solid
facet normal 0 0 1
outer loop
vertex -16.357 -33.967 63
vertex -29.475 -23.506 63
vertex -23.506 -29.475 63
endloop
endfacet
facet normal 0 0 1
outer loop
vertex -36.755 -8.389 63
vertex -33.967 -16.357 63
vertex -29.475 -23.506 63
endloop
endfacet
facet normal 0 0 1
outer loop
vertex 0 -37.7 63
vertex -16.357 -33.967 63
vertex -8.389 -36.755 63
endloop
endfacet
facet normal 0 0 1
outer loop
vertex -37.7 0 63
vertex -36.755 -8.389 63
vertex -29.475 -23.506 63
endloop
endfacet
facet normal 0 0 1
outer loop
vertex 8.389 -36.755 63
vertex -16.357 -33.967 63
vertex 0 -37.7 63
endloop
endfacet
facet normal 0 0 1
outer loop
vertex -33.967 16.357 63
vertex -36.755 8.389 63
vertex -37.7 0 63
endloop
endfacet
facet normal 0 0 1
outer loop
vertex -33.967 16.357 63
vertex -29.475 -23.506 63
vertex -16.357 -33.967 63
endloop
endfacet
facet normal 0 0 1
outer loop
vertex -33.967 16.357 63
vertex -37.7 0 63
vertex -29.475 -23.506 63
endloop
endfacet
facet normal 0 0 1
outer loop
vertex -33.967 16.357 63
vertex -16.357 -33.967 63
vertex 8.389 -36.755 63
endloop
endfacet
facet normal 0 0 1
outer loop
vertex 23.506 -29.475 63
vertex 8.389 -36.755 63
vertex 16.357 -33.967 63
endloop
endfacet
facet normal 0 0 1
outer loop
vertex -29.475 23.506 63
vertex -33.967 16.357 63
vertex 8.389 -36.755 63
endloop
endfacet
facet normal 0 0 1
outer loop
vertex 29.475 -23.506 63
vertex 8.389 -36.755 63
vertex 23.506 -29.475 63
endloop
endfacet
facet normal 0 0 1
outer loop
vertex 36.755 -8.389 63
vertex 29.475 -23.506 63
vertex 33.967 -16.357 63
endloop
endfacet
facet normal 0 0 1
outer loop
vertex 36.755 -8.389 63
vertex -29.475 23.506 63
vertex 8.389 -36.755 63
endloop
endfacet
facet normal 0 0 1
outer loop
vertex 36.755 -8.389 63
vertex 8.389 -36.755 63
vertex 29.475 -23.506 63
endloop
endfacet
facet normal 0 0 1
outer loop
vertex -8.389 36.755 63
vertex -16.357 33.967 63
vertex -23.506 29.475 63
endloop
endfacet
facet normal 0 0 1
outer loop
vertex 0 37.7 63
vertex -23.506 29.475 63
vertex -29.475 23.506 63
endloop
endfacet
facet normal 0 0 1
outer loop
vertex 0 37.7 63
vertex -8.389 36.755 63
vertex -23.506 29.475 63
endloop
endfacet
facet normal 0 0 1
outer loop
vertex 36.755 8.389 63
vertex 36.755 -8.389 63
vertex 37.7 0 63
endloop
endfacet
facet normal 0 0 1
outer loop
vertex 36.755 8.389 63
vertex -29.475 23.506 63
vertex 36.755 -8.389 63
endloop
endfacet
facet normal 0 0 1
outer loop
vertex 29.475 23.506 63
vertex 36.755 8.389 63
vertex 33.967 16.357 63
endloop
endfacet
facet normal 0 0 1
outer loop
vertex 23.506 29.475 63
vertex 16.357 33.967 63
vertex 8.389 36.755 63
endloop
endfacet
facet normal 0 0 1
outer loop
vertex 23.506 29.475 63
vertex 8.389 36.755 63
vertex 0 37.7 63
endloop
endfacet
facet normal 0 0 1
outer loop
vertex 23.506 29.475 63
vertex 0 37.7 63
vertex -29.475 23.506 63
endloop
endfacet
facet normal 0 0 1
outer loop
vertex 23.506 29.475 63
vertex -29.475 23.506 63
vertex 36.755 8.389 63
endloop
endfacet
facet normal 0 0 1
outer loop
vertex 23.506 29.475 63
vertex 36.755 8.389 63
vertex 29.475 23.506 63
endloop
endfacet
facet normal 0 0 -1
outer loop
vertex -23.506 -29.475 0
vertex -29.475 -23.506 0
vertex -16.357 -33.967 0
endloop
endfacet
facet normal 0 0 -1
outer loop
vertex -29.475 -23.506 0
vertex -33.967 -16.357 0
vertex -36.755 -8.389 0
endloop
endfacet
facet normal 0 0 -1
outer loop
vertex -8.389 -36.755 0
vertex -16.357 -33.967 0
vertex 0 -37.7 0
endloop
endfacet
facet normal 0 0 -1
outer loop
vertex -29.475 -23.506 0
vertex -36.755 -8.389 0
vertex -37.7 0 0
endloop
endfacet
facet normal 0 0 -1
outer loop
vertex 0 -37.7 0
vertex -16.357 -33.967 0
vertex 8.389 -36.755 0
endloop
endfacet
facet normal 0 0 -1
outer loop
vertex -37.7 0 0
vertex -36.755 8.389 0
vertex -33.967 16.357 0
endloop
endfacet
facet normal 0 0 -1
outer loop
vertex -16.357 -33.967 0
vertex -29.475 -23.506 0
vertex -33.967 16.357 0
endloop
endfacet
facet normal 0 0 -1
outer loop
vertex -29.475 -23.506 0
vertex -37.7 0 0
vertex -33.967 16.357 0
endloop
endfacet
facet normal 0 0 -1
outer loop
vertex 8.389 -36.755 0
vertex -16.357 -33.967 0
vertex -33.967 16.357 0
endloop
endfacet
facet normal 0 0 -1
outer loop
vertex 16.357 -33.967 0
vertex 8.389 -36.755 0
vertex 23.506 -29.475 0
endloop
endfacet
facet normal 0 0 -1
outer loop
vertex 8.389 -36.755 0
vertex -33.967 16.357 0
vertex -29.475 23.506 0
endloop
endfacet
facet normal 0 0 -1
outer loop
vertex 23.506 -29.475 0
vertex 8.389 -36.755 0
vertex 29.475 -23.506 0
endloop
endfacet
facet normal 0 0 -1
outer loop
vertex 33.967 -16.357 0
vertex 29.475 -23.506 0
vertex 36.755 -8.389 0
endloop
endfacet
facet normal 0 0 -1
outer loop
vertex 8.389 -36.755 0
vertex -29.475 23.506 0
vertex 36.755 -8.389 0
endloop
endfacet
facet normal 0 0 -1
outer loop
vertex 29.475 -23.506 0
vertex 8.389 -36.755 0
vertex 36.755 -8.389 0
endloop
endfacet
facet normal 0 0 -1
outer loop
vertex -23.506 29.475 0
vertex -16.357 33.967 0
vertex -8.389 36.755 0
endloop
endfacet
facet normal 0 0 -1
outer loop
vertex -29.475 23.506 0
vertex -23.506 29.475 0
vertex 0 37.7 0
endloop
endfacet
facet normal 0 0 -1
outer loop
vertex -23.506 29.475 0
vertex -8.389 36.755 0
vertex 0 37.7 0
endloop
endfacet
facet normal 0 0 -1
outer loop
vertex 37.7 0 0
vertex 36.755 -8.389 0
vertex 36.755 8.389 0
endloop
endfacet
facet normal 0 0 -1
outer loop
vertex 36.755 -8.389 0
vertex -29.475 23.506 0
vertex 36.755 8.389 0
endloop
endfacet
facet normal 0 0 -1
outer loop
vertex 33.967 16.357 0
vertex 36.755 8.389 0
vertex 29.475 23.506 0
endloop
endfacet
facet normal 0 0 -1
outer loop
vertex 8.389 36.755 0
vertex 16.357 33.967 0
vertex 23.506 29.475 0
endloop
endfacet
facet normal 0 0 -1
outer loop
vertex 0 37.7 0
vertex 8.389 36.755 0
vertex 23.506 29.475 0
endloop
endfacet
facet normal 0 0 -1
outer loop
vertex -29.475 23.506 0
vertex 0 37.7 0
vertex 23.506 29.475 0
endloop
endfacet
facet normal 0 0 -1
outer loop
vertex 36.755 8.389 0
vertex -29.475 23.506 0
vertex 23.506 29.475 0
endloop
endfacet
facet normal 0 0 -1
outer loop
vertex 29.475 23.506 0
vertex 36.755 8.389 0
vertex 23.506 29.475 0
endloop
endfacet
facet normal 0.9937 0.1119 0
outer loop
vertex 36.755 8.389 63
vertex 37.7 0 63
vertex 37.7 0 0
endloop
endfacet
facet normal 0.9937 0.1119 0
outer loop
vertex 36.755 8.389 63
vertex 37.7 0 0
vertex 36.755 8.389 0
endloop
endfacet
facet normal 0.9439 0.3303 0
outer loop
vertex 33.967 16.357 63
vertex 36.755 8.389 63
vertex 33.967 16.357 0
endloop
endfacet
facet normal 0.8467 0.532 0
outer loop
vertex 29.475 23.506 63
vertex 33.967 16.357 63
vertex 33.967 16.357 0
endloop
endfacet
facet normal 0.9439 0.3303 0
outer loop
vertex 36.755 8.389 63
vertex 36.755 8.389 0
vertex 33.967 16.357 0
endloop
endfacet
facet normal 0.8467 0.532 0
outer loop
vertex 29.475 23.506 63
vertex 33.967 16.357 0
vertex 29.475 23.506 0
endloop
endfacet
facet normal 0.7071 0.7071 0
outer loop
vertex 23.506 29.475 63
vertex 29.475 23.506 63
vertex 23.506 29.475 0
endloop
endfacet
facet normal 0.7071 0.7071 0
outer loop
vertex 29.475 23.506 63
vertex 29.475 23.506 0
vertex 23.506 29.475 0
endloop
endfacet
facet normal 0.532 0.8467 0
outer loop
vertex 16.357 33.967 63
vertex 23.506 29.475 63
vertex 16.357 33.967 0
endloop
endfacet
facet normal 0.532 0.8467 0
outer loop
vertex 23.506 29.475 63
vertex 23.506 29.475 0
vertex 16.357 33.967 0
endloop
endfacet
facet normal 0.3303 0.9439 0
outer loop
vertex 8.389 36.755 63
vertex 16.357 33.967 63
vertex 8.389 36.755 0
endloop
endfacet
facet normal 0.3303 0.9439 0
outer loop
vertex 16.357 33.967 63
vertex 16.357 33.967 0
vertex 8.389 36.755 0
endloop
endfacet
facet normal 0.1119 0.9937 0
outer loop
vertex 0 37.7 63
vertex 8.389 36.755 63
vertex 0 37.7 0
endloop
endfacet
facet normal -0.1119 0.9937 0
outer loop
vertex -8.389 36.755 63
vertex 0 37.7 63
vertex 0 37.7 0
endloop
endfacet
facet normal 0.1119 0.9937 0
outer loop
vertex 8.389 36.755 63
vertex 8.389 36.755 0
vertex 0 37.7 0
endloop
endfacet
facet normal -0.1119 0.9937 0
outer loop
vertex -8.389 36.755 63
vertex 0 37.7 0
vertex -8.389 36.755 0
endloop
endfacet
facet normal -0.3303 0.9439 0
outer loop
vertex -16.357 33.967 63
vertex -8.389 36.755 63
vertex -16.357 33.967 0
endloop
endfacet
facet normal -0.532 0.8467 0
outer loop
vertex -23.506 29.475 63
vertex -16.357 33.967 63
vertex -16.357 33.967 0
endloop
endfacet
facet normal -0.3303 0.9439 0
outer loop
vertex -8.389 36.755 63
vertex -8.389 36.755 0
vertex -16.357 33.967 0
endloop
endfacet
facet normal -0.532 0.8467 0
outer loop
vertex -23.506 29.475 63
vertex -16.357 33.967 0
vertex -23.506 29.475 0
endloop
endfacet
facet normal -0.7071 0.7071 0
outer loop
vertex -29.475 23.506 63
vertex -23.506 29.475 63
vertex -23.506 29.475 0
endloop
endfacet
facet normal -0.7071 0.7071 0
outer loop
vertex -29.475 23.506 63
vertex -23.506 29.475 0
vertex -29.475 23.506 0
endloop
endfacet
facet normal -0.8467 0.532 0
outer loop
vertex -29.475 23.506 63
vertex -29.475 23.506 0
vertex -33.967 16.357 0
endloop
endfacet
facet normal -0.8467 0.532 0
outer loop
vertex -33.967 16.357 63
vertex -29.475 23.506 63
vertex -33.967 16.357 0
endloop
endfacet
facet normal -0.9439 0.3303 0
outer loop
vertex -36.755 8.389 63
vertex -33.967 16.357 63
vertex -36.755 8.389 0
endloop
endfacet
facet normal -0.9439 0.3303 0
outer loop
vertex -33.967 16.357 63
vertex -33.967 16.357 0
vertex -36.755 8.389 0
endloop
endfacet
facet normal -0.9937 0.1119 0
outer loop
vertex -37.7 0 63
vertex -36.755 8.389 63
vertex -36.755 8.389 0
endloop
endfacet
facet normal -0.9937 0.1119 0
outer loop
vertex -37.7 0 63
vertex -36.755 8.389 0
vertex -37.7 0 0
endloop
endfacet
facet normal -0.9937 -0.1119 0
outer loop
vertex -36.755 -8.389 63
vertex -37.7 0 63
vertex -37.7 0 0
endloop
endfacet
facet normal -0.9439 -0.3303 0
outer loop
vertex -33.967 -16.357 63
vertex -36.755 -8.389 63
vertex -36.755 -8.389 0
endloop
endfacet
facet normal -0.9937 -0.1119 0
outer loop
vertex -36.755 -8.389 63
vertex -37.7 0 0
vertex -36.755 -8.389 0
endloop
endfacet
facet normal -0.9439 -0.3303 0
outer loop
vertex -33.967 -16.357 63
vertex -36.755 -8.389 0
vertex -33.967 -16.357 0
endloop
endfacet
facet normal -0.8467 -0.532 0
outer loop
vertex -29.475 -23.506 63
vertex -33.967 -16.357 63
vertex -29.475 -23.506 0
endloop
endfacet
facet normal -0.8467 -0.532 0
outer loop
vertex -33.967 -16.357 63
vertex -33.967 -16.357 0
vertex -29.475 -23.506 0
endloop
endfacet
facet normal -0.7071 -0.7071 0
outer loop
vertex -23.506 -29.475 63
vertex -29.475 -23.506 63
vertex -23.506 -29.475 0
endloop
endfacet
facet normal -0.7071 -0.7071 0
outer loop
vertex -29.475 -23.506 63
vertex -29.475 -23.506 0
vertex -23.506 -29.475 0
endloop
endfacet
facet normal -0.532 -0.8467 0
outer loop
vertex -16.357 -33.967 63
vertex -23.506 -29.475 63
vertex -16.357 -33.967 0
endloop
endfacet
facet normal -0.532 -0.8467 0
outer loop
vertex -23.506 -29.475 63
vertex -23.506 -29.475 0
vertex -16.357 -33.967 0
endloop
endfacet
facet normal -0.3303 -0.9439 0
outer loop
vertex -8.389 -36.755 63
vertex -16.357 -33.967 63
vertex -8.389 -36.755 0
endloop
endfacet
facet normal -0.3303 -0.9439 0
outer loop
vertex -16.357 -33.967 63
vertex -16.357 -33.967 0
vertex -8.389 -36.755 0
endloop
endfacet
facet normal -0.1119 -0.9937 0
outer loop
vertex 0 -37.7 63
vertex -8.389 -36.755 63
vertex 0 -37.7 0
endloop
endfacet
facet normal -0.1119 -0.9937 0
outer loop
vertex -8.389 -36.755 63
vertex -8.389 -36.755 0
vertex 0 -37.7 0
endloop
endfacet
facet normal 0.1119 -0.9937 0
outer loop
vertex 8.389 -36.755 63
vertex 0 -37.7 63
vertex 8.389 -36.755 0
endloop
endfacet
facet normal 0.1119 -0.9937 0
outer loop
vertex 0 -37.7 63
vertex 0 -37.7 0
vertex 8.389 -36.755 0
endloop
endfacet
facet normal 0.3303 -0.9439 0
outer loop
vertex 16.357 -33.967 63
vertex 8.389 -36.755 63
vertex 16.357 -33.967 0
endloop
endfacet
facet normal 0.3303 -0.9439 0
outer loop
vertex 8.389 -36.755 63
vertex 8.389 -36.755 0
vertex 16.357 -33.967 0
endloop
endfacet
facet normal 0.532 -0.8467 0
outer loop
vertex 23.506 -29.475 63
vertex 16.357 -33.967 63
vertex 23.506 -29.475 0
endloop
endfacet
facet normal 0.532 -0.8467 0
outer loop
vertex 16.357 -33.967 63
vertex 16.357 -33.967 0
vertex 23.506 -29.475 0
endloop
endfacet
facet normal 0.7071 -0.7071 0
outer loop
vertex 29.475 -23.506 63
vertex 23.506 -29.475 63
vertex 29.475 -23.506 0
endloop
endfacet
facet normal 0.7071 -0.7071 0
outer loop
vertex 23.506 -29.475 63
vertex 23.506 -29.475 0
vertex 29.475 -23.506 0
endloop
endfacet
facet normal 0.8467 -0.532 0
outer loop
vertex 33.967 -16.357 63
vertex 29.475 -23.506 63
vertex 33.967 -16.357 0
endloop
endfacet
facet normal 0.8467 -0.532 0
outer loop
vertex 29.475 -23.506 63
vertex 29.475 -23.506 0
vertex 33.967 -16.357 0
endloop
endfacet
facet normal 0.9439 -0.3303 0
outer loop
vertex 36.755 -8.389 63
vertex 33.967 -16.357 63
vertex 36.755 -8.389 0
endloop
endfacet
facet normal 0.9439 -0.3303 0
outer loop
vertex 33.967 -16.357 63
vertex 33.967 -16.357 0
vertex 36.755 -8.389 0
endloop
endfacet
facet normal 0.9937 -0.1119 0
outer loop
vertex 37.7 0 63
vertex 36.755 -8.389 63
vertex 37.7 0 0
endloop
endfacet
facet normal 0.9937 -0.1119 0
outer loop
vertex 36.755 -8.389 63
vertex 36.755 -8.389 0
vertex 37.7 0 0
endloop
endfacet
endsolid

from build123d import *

# Parameters (mm, degrees)
CYLINDER009_R     = 2.65
CYLINDER009_DEPTH = 30
CYLINDER008_R     = 4
CYLINDER008_DEPTH = 3.2
CYLINDER010_R     = 1.375
CYLINDER010_DEPTH = 10
CYLINDER011_R     = 2.6
CYLINDER011_DEPTH = 2.1
ARRAY002_X_COUNT  = 2
ARRAY002_X_PITCH  = 15
CYLINDER007_R     = 37.7
CYLINDER007_DEPTH = 63


with BuildPart() as cylinder009:
    # Cylinder009 → Cylinder009 (new body)
    with BuildSketch(Plane.XY.offset(63)):
        Circle(CYLINDER009_R)
    extrude(amount=CYLINDER009_DEPTH)


with BuildPart() as cylinder008:
    # Cylinder008 → Cylinder008 (new body)
    with BuildSketch(Plane.XY.offset(64.8)):
        Circle(CYLINDER008_R)
    extrude(amount=CYLINDER008_DEPTH)


with BuildPart() as cylinder010:
    # Cylinder010 → Cylinder010 (new body)
    with BuildSketch(Plane.XY):
        Circle(CYLINDER010_R)
    extrude(amount=CYLINDER010_DEPTH)


with BuildPart() as fusion005:
    # Cylinder011 → Cylinder011 (new body)
    with BuildSketch(Plane.XY):
        Circle(CYLINDER011_R)
    extrude(amount=CYLINDER011_DEPTH)

    # Fusion004: union Cylinder010
    add(cylinder010.part)


with BuildPart() as fusion005_1:
    # Fusion004 placement: moved
    add(fusion005.part.moved(Location((0, 0, 63))))

    # Array002 X: Fusion005 ×2


with BuildPart() as fusion005_2:
    add(fusion005_1.part)
    with Locations(*[(i * ARRAY002_X_PITCH, 0, 0) for i in range(1, ARRAY002_X_COUNT)]):
        add(fusion005_1.part)


with BuildPart() as fusion005_3:
    # Array002 placement: moved
    add(fusion005_2.part.moved(Location((-7.5, 0, 0))))

    # Fusion005: union Cylinder009, Cylinder008
    add(cylinder009.part)
    add(cylinder008.part)


with BuildPart() as cut007:
    # Cylinder007 → Cylinder007 (new body)
    with BuildSketch(Plane.XY):
        Circle(CYLINDER007_R)
    extrude(amount=CYLINDER007_DEPTH)

    # Cut007: cut Fusion005
    add(fusion005_3.part, mode=Mode.SUBTRACT)


solid = cut007.part
